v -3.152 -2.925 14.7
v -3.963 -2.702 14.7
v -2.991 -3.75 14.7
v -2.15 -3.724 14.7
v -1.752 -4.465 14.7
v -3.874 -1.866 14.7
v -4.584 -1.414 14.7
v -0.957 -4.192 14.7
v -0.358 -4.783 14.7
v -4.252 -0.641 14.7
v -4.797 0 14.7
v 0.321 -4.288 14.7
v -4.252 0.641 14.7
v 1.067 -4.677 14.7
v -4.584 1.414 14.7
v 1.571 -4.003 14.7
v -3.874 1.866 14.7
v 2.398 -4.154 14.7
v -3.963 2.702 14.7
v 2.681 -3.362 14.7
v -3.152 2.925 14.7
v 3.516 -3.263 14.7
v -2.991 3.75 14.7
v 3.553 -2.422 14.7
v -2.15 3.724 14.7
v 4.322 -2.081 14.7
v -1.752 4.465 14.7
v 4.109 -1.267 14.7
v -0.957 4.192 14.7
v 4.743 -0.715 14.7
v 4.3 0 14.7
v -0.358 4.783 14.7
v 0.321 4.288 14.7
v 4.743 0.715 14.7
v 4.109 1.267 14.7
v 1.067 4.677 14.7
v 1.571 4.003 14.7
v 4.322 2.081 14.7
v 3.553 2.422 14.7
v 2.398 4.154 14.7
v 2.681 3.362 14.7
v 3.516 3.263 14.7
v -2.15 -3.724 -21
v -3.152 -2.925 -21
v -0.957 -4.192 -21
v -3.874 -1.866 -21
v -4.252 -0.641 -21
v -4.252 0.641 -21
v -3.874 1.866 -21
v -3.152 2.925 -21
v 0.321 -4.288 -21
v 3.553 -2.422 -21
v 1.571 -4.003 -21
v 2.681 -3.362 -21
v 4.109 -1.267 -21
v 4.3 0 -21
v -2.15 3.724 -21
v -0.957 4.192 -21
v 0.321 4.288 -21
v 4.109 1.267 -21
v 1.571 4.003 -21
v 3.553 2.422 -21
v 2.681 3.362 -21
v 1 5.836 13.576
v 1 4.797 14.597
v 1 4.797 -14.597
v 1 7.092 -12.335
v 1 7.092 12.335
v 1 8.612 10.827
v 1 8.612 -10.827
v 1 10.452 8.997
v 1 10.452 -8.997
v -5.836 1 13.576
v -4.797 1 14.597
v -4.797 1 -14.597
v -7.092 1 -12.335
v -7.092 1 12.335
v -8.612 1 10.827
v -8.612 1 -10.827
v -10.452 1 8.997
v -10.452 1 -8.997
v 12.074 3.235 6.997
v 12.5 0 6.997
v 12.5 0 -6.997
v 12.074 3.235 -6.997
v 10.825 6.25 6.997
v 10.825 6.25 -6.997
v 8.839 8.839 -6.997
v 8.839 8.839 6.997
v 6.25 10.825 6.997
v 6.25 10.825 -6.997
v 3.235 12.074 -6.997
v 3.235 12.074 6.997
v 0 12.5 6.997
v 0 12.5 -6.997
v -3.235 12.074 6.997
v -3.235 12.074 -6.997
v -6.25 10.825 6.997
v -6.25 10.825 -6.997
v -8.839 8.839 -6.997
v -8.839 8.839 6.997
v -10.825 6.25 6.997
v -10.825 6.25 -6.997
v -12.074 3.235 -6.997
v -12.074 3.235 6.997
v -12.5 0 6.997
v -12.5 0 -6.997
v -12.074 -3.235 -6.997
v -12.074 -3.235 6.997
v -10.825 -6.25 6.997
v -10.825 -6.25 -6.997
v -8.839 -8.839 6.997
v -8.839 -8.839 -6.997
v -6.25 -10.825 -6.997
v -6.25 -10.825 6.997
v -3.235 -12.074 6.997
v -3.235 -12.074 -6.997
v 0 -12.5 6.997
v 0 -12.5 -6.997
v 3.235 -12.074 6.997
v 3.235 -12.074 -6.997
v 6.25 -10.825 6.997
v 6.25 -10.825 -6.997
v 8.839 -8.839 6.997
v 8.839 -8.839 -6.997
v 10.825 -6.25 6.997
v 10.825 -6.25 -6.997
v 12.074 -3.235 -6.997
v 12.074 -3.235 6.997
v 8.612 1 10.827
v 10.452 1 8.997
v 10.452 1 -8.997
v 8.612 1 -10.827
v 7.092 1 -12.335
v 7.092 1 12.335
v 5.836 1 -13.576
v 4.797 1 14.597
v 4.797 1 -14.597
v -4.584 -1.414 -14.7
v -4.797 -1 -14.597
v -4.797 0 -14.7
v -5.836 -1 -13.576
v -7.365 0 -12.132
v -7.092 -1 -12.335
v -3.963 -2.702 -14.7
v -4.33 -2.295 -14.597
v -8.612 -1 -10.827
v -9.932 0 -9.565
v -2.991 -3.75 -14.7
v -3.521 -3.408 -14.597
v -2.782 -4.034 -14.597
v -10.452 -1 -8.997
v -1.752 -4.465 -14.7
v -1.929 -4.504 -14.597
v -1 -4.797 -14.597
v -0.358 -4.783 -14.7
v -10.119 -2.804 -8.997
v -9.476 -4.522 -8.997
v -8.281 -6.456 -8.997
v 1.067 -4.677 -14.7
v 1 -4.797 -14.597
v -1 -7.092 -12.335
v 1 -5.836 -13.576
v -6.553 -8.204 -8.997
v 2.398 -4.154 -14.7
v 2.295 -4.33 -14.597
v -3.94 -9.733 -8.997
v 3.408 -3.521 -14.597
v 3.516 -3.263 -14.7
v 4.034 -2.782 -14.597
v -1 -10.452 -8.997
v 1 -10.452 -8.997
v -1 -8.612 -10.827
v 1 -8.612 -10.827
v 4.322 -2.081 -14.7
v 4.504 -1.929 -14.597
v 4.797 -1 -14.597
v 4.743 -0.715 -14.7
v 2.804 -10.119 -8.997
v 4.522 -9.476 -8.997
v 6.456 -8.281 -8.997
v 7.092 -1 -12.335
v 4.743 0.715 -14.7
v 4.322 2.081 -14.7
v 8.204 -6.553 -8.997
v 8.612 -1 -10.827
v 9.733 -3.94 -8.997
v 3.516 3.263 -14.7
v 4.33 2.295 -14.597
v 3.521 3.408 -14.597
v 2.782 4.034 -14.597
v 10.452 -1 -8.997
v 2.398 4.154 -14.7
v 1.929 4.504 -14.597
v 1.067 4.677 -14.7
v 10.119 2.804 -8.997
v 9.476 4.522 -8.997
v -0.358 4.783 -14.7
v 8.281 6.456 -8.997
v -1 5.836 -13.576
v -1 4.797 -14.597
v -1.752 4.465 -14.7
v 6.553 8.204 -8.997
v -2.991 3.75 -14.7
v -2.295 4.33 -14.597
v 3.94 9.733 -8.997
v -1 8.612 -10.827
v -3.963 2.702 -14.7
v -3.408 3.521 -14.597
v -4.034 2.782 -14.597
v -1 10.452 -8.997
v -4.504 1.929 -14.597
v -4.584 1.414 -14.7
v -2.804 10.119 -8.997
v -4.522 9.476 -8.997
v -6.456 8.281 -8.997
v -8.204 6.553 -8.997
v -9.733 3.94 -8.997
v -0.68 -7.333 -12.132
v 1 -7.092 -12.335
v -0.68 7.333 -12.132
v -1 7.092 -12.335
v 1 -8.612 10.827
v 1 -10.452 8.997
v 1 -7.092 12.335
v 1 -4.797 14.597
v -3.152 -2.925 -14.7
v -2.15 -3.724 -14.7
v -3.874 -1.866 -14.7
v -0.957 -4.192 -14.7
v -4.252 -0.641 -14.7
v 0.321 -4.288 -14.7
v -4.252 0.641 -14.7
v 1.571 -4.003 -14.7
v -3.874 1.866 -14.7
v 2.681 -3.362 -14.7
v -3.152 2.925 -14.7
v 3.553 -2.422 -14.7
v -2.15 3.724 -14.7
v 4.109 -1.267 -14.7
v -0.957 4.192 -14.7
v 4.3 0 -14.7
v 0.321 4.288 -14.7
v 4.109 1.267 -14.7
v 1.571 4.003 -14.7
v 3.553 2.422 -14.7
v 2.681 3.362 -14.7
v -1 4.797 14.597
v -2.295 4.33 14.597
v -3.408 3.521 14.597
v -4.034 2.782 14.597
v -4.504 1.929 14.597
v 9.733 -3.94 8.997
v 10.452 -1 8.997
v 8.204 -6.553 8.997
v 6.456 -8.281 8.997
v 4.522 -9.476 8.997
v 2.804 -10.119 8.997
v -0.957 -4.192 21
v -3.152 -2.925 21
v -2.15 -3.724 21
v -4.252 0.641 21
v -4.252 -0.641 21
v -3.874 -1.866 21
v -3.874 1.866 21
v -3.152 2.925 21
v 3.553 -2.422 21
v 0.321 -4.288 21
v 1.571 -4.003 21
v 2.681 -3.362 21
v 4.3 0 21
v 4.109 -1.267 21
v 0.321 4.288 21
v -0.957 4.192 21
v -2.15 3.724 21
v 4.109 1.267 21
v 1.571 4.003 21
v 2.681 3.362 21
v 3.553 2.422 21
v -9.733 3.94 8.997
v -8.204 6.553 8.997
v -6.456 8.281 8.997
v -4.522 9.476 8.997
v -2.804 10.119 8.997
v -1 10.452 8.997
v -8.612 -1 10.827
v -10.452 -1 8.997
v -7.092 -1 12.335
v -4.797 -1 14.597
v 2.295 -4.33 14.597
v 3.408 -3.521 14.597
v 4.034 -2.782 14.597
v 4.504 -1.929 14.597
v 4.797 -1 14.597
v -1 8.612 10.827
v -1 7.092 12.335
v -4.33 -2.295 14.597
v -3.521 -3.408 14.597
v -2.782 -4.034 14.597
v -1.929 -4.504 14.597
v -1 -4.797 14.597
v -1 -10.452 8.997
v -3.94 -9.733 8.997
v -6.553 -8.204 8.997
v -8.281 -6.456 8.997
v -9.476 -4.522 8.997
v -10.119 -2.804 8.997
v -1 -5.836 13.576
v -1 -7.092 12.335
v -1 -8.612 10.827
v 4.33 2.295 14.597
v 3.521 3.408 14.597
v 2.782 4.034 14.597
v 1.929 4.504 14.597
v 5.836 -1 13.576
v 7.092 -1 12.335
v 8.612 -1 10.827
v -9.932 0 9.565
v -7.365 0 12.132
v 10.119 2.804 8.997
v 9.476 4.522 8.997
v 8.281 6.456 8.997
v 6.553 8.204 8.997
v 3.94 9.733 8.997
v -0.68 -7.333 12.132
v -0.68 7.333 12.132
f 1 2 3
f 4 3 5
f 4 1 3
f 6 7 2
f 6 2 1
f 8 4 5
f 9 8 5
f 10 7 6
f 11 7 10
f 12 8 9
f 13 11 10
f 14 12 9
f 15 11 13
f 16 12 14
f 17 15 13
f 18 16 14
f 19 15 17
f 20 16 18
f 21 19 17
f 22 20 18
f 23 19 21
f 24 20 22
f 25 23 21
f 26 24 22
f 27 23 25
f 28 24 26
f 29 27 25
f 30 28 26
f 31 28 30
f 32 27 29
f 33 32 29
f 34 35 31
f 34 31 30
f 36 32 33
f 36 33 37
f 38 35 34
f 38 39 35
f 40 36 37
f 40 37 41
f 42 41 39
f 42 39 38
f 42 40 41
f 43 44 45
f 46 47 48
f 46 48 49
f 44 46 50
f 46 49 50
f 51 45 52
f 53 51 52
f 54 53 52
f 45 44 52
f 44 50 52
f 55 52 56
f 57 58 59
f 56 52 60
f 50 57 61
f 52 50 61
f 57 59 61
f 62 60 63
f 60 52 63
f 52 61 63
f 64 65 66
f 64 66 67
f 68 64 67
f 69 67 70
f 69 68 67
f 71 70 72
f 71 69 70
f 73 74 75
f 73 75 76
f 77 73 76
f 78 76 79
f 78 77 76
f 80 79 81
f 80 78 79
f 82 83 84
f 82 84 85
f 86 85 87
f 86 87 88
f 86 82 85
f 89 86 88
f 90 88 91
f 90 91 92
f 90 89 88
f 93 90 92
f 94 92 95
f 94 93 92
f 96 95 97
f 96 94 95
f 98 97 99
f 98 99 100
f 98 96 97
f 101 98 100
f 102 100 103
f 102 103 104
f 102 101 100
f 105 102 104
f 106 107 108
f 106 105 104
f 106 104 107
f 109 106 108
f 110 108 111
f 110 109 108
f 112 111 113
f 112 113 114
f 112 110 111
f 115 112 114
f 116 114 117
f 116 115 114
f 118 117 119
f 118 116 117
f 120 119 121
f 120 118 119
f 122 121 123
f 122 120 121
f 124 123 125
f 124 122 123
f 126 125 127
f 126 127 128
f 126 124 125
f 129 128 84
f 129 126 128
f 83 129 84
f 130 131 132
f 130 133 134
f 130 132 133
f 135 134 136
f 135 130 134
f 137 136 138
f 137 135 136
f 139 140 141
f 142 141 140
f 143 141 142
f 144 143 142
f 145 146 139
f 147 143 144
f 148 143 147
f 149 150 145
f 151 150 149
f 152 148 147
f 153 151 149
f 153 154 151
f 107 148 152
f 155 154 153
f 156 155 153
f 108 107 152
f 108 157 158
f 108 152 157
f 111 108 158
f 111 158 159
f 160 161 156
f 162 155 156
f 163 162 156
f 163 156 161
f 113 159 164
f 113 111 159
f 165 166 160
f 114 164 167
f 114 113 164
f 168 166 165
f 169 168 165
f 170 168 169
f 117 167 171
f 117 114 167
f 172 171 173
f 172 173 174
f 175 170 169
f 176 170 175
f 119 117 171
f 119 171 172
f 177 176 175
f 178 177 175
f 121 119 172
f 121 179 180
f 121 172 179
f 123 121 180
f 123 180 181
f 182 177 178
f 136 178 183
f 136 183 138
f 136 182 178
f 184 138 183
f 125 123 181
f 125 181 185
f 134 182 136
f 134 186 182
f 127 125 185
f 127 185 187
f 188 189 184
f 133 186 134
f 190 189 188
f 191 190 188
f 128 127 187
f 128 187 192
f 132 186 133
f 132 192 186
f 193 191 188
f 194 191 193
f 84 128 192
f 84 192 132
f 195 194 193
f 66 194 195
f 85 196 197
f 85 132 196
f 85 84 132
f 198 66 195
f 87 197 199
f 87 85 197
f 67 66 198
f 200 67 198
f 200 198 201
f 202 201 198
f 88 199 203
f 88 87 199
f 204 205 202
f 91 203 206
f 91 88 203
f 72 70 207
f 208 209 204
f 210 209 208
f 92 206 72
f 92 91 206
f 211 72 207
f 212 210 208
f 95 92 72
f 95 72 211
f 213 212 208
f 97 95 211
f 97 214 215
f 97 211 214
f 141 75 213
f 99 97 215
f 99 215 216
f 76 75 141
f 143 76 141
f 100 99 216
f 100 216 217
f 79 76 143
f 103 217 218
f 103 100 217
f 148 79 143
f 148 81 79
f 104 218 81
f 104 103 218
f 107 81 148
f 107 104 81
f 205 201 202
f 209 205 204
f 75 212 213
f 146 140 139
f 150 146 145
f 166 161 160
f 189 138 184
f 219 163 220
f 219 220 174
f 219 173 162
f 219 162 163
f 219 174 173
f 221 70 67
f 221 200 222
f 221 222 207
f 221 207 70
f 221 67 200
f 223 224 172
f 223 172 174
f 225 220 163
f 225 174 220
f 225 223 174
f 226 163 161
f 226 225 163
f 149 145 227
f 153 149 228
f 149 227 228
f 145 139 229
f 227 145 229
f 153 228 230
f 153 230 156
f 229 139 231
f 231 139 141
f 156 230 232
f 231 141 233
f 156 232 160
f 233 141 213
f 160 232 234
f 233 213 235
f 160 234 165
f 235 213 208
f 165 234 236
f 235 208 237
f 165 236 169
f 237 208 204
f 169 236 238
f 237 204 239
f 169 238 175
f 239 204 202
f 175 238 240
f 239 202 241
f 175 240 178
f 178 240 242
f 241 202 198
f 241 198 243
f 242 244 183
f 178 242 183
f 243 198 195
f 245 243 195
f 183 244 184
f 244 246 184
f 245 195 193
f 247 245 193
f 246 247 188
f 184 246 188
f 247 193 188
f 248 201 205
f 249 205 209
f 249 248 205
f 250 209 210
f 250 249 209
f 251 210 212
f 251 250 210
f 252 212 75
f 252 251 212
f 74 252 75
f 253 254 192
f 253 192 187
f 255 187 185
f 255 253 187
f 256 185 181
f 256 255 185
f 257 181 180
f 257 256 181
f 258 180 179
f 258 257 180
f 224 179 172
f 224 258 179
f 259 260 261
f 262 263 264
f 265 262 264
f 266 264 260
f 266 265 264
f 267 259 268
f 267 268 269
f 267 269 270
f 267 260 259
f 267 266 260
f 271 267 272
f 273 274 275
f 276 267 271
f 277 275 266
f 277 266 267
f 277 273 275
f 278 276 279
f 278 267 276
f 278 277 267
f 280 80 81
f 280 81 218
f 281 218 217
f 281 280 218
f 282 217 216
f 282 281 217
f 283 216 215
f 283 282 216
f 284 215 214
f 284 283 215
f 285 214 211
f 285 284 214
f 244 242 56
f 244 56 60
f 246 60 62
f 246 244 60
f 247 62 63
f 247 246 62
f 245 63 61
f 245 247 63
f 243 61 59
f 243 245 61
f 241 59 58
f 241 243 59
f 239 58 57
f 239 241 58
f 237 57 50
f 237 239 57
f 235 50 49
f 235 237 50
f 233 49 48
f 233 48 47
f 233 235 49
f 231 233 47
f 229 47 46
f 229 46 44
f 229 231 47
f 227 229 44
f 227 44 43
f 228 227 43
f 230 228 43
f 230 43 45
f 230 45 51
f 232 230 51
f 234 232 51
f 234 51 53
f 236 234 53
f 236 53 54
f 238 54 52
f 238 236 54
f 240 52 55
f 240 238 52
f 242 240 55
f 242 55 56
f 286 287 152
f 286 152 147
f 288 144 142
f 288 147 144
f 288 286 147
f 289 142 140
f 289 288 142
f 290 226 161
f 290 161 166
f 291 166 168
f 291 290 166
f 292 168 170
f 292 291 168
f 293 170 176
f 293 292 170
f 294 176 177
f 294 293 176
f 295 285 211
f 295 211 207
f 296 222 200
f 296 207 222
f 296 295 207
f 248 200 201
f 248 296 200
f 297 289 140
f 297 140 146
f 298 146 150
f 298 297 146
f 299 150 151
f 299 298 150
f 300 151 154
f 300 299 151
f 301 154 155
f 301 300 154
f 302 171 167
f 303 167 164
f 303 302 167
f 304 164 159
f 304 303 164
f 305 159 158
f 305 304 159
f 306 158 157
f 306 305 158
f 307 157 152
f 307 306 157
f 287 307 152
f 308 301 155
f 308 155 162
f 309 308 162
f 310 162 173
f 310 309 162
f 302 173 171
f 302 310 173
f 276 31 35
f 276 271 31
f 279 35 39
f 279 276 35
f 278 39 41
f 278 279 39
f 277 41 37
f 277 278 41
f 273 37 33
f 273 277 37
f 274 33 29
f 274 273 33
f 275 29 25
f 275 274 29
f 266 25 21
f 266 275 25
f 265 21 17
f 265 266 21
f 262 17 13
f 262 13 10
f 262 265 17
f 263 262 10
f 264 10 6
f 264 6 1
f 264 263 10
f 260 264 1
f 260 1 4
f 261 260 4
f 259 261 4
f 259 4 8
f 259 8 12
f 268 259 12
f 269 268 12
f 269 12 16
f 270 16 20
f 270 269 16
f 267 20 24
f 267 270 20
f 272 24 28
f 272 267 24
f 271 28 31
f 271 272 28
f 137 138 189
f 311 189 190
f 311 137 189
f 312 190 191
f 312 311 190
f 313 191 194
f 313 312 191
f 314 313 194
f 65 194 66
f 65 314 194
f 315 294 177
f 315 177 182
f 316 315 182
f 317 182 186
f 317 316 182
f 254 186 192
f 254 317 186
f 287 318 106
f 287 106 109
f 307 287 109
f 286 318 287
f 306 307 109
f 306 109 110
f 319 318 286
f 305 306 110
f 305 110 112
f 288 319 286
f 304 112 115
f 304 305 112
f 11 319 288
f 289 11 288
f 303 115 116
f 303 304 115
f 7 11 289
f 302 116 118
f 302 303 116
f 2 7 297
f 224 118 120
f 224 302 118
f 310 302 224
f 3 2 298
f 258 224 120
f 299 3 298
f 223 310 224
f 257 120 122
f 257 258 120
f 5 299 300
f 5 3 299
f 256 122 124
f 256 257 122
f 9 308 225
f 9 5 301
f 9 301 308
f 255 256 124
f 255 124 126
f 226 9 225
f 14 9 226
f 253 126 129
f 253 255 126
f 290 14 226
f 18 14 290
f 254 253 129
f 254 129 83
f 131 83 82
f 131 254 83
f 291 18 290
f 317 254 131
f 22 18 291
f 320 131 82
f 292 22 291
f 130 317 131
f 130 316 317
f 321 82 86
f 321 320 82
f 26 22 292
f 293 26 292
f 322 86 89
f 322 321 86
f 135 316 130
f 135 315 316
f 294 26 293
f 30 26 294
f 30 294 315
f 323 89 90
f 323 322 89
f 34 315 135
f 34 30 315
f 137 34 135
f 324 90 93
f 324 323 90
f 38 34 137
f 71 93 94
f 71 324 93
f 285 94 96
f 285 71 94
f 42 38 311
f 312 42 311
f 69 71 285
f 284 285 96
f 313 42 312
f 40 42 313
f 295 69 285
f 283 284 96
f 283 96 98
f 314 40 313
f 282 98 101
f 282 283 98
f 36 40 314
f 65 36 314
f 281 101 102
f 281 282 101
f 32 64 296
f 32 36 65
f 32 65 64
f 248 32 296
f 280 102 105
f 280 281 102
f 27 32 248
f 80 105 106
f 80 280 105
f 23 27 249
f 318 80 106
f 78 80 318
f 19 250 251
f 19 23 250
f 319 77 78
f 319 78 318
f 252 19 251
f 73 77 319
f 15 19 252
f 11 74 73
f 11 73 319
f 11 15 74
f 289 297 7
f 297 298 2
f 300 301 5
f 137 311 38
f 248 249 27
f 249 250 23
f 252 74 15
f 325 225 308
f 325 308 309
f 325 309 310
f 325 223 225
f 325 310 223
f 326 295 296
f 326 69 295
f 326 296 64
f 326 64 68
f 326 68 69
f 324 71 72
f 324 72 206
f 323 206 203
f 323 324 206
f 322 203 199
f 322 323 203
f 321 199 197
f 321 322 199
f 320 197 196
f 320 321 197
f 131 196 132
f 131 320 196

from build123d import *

# Parameters (mm, degrees)
F0_R     = 4.3
F0_R_2   = 2.3
F1_DEPTH = 21
F0_R_3   = 12.5
F2_DEPTH = 14.7


with BuildPart() as f1:
    # F0 (on Top) → F1 (new body, symmetric)
    with BuildSketch(Plane.XY):
        Circle(F0_R)
        Circle(F0_R_2, mode=Mode.SUBTRACT)
        Circle(F0_R_2)
    extrude(amount=F1_DEPTH, both=True)

    # F0 (on Top) → F2 (join, symmetric)
    with BuildSketch(Plane.XY):
        Circle(F0_R_3)
        with BuildLine():
            ThreePointArc((1, 10.4522724802), (7.4246212025, 7.4246212025), (10.4522724802, 1))
            ThreePointArc((10.4522724802, 1), (10.4880613328, 0.5005691551), (10.5, 0))
            ThreePointArc((10.5, 0), (10.4880613328, -0.5005691551), (10.4522724802, -1))
            ThreePointArc((10.4522724802, -1), (7.4246212025, -7.4246212025), (1, -10.4522724802))
            ThreePointArc((1, -10.4522724802), (0, -10.5), (-1, -10.4522724802))
            ThreePointArc((-1, -10.4522724802), (-7.4246212025, -7.4246212025), (-10.4522724802, -1))
            ThreePointArc((-10.4522724802, -1), (-10.5, 0), (-10.4522724802, 1))
            ThreePointArc((-10.4522724802, 1), (-7.4246212025, 7.4246212025), (-1, 10.4522724802))
            ThreePointArc((-1, 10.4522724802), (0, 10.5), (1, 10.4522724802))
        make_face(mode=Mode.SUBTRACT)
        with BuildLine():
            ThreePointArc((4.7968739821, -1), (4.8741503112, -0.5026517123), (4.9, 0))
            ThreePointArc((4.9, 0), (4.8741503112, 0.5026517123), (4.7968739821, 1))
            ThreePointArc((4.7968739821, 1), (3.4648232278, 3.4648232278), (1, 4.7968739821))
            ThreePointArc((1, 4.7968739821), (0, 4.9), (-1, 4.7968739821))
            ThreePointArc((-1, 4.7968739821), (-3.4648232278, 3.4648232278), (-4.7968739821, 1))
            ThreePointArc((-4.7968739821, 1), (-4.9, 0), (-4.7968739821, -1))
            ThreePointArc((-4.7968739821, -1), (-3.4648232278, -3.4648232278), (-1, -4.7968739821))
            ThreePointArc((-1, -4.7968739821), (0, -4.9), (1, -4.7968739821))
            ThreePointArc((1, -4.7968739821), (3.4648232278, -3.4648232278), (4.7968739821, -1))
        make_face()
        Circle(F0_R, mode=Mode.SUBTRACT)
        with BuildLine():
            ThreePointArc((-4.7968739821, -1), (-4.9, 0), (-4.7968739821, 1))
            Line((-4.7968739821, 1), (-10.4522724802, 1))
            ThreePointArc((-10.4522724802, 1), (-10.5, 0), (-10.4522724802, -1))
            Line((-10.4522724802, -1), (-4.7968739821, -1))
        make_face()
        with BuildLine():
            Line((1, -10.4522724802), (1, -4.7968739821))
            ThreePointArc((1, -4.7968739821), (0, -4.9), (-1, -4.7968739821))
            Line((-1, -4.7968739821), (-1, -10.4522724802))
            ThreePointArc((-1, -10.4522724802), (0, -10.5), (1, -10.4522724802))
        make_face()
        with BuildLine():
            ThreePointArc((4.7968739821, 1), (4.8741503112, 0.5026517123), (4.9, 0))
            ThreePointArc((4.9, 0), (4.8741503112, -0.5026517123), (4.7968739821, -1))
            Line((4.7968739821, -1), (10.4522724802, -1))
            ThreePointArc((10.4522724802, -1), (10.4880613328, -0.5005691551), (10.5, 0))
            ThreePointArc((10.5, 0), (10.4880613328, 0.5005691551), (10.4522724802, 1))
            Line((10.4522724802, 1), (4.7968739821, 1))
        make_face()
        with BuildLine():
            ThreePointArc((-1, 4.7968739821), (0, 4.9), (1, 4.7968739821))
            Line((1, 4.7968739821), (1, 10.4522724802))
            ThreePointArc((1, 10.4522724802), (0, 10.5), (-1, 10.4522724802))
            Line((-1, 10.4522724802), (-1, 4.7968739821))
        make_face()
    extrude(amount=F2_DEPTH, both=True)

    # F3 (on Front) → F4 (revolve, cut)
    with BuildSketch(Plane.XZ):
        Polygon((-13.4317712075, 14.7), (-13.4317712075, 6.0651027746), (-4.7968739821, 14.7), align=None)
        Polygon((-13.4317712075, -14.7), (-4.7968739821, -14.7), (-13.4317712075, -6.0651027746), align=None)
    revolve(axis=Axis((0, 0, -14.7), (0, 0, 1)), mode=Mode.SUBTRACT)


solid = f1.part
